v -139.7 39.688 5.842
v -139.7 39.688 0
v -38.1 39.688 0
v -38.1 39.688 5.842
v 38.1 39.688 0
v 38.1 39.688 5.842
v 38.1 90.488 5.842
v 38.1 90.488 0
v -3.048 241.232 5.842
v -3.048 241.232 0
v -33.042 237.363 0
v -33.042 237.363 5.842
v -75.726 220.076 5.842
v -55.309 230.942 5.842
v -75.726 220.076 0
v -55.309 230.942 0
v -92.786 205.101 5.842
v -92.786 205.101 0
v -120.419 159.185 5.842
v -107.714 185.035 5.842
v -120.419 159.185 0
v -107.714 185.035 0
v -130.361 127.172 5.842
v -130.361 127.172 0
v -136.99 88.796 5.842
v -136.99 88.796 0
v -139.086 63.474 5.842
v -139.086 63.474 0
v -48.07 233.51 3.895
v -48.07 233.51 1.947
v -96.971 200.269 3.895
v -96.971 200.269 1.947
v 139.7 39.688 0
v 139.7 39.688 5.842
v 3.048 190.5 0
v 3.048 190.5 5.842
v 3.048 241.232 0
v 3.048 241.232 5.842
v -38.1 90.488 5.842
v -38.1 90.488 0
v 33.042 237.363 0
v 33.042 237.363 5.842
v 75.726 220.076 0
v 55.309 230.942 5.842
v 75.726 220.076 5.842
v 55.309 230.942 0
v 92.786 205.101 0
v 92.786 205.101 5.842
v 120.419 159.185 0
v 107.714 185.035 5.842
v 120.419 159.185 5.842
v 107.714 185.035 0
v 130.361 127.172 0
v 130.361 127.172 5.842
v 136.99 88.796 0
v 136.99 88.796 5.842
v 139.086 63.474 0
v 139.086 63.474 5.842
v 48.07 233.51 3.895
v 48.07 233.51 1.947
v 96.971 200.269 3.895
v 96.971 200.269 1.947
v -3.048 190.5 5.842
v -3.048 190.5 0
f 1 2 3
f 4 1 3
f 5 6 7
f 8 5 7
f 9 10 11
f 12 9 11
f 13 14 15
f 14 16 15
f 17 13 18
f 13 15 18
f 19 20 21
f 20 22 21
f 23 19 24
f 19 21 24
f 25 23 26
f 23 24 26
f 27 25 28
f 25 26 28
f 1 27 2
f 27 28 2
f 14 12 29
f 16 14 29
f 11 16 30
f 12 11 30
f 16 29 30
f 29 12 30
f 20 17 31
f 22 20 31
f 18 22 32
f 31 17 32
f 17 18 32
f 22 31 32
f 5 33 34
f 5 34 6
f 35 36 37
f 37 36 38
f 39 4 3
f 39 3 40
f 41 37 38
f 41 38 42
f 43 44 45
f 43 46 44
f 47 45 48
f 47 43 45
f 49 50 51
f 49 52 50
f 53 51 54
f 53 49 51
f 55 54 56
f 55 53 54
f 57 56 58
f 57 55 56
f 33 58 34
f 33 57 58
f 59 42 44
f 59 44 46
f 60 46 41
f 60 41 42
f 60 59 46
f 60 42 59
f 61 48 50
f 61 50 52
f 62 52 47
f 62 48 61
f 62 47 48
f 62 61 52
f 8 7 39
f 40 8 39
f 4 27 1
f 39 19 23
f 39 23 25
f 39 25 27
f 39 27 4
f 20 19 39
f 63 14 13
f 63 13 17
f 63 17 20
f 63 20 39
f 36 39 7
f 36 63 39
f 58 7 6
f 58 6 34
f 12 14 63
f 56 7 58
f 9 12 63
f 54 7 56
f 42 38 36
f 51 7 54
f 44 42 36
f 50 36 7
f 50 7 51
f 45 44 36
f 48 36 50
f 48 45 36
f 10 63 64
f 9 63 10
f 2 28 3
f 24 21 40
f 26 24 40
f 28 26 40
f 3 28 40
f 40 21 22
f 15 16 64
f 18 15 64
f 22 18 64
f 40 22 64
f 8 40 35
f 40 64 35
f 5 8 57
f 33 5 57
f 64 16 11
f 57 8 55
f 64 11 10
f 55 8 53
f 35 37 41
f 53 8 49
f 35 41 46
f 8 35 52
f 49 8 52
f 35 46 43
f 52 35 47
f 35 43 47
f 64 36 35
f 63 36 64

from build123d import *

# Parameters (mm, degrees)
BOSS_EXTRUDE1_DEPTH = 5.842
SKETCH3_W           = 38.1
SKETCH3_H           = 50.8
SKETCH3_W_2         = 3.048
CUT_EXTRUDE1_DEPTH  = 279.88332514


with BuildPart() as part:
    # Sketch2 → Boss-Extrude1 (new body)
    with BuildSketch(Plane.XY):
        with BuildLine():
            Line((139.7, 39.6875), (0, 39.6875))
            Line((0, 39.6875), (0, 241.3))
            add(Edge.make_bspline(
                [(0, 241.3), (9.008186532, 241.3), (56.656890408, 236.359137648), (128.782940081, 181.905443126), (139.7, 89.922843118), (139.7, 39.6875)],
                knots=[0, 0, 0, 0, 0.176272275, 0.390301895, 1, 1, 1, 1], degree=3))
        make_face()
    extrude(amount=BOSS_EXTRUDE1_DEPTH)

    # Sketch3 → Cut-Extrude1 (cut, through all)
    with BuildSketch(Plane.XY.offset(5.842)):
        with Locations((19.05, 65.0875)):
            Rectangle(SKETCH3_W, SKETCH3_H)
        with Locations((1.524, 215.9)):
            Rectangle(SKETCH3_W_2, SKETCH3_H)
    extrude(amount=-CUT_EXTRUDE1_DEPTH, mode=Mode.SUBTRACT)

    # Mirror1: part across plane


with BuildPart() as part_1:
    add(part.part)
    add(part.part.mirror(Plane(origin=(0, 0, 0), x_dir=(0, 0, 1), z_dir=(1, 0, 0))))


solid = part_1.part
